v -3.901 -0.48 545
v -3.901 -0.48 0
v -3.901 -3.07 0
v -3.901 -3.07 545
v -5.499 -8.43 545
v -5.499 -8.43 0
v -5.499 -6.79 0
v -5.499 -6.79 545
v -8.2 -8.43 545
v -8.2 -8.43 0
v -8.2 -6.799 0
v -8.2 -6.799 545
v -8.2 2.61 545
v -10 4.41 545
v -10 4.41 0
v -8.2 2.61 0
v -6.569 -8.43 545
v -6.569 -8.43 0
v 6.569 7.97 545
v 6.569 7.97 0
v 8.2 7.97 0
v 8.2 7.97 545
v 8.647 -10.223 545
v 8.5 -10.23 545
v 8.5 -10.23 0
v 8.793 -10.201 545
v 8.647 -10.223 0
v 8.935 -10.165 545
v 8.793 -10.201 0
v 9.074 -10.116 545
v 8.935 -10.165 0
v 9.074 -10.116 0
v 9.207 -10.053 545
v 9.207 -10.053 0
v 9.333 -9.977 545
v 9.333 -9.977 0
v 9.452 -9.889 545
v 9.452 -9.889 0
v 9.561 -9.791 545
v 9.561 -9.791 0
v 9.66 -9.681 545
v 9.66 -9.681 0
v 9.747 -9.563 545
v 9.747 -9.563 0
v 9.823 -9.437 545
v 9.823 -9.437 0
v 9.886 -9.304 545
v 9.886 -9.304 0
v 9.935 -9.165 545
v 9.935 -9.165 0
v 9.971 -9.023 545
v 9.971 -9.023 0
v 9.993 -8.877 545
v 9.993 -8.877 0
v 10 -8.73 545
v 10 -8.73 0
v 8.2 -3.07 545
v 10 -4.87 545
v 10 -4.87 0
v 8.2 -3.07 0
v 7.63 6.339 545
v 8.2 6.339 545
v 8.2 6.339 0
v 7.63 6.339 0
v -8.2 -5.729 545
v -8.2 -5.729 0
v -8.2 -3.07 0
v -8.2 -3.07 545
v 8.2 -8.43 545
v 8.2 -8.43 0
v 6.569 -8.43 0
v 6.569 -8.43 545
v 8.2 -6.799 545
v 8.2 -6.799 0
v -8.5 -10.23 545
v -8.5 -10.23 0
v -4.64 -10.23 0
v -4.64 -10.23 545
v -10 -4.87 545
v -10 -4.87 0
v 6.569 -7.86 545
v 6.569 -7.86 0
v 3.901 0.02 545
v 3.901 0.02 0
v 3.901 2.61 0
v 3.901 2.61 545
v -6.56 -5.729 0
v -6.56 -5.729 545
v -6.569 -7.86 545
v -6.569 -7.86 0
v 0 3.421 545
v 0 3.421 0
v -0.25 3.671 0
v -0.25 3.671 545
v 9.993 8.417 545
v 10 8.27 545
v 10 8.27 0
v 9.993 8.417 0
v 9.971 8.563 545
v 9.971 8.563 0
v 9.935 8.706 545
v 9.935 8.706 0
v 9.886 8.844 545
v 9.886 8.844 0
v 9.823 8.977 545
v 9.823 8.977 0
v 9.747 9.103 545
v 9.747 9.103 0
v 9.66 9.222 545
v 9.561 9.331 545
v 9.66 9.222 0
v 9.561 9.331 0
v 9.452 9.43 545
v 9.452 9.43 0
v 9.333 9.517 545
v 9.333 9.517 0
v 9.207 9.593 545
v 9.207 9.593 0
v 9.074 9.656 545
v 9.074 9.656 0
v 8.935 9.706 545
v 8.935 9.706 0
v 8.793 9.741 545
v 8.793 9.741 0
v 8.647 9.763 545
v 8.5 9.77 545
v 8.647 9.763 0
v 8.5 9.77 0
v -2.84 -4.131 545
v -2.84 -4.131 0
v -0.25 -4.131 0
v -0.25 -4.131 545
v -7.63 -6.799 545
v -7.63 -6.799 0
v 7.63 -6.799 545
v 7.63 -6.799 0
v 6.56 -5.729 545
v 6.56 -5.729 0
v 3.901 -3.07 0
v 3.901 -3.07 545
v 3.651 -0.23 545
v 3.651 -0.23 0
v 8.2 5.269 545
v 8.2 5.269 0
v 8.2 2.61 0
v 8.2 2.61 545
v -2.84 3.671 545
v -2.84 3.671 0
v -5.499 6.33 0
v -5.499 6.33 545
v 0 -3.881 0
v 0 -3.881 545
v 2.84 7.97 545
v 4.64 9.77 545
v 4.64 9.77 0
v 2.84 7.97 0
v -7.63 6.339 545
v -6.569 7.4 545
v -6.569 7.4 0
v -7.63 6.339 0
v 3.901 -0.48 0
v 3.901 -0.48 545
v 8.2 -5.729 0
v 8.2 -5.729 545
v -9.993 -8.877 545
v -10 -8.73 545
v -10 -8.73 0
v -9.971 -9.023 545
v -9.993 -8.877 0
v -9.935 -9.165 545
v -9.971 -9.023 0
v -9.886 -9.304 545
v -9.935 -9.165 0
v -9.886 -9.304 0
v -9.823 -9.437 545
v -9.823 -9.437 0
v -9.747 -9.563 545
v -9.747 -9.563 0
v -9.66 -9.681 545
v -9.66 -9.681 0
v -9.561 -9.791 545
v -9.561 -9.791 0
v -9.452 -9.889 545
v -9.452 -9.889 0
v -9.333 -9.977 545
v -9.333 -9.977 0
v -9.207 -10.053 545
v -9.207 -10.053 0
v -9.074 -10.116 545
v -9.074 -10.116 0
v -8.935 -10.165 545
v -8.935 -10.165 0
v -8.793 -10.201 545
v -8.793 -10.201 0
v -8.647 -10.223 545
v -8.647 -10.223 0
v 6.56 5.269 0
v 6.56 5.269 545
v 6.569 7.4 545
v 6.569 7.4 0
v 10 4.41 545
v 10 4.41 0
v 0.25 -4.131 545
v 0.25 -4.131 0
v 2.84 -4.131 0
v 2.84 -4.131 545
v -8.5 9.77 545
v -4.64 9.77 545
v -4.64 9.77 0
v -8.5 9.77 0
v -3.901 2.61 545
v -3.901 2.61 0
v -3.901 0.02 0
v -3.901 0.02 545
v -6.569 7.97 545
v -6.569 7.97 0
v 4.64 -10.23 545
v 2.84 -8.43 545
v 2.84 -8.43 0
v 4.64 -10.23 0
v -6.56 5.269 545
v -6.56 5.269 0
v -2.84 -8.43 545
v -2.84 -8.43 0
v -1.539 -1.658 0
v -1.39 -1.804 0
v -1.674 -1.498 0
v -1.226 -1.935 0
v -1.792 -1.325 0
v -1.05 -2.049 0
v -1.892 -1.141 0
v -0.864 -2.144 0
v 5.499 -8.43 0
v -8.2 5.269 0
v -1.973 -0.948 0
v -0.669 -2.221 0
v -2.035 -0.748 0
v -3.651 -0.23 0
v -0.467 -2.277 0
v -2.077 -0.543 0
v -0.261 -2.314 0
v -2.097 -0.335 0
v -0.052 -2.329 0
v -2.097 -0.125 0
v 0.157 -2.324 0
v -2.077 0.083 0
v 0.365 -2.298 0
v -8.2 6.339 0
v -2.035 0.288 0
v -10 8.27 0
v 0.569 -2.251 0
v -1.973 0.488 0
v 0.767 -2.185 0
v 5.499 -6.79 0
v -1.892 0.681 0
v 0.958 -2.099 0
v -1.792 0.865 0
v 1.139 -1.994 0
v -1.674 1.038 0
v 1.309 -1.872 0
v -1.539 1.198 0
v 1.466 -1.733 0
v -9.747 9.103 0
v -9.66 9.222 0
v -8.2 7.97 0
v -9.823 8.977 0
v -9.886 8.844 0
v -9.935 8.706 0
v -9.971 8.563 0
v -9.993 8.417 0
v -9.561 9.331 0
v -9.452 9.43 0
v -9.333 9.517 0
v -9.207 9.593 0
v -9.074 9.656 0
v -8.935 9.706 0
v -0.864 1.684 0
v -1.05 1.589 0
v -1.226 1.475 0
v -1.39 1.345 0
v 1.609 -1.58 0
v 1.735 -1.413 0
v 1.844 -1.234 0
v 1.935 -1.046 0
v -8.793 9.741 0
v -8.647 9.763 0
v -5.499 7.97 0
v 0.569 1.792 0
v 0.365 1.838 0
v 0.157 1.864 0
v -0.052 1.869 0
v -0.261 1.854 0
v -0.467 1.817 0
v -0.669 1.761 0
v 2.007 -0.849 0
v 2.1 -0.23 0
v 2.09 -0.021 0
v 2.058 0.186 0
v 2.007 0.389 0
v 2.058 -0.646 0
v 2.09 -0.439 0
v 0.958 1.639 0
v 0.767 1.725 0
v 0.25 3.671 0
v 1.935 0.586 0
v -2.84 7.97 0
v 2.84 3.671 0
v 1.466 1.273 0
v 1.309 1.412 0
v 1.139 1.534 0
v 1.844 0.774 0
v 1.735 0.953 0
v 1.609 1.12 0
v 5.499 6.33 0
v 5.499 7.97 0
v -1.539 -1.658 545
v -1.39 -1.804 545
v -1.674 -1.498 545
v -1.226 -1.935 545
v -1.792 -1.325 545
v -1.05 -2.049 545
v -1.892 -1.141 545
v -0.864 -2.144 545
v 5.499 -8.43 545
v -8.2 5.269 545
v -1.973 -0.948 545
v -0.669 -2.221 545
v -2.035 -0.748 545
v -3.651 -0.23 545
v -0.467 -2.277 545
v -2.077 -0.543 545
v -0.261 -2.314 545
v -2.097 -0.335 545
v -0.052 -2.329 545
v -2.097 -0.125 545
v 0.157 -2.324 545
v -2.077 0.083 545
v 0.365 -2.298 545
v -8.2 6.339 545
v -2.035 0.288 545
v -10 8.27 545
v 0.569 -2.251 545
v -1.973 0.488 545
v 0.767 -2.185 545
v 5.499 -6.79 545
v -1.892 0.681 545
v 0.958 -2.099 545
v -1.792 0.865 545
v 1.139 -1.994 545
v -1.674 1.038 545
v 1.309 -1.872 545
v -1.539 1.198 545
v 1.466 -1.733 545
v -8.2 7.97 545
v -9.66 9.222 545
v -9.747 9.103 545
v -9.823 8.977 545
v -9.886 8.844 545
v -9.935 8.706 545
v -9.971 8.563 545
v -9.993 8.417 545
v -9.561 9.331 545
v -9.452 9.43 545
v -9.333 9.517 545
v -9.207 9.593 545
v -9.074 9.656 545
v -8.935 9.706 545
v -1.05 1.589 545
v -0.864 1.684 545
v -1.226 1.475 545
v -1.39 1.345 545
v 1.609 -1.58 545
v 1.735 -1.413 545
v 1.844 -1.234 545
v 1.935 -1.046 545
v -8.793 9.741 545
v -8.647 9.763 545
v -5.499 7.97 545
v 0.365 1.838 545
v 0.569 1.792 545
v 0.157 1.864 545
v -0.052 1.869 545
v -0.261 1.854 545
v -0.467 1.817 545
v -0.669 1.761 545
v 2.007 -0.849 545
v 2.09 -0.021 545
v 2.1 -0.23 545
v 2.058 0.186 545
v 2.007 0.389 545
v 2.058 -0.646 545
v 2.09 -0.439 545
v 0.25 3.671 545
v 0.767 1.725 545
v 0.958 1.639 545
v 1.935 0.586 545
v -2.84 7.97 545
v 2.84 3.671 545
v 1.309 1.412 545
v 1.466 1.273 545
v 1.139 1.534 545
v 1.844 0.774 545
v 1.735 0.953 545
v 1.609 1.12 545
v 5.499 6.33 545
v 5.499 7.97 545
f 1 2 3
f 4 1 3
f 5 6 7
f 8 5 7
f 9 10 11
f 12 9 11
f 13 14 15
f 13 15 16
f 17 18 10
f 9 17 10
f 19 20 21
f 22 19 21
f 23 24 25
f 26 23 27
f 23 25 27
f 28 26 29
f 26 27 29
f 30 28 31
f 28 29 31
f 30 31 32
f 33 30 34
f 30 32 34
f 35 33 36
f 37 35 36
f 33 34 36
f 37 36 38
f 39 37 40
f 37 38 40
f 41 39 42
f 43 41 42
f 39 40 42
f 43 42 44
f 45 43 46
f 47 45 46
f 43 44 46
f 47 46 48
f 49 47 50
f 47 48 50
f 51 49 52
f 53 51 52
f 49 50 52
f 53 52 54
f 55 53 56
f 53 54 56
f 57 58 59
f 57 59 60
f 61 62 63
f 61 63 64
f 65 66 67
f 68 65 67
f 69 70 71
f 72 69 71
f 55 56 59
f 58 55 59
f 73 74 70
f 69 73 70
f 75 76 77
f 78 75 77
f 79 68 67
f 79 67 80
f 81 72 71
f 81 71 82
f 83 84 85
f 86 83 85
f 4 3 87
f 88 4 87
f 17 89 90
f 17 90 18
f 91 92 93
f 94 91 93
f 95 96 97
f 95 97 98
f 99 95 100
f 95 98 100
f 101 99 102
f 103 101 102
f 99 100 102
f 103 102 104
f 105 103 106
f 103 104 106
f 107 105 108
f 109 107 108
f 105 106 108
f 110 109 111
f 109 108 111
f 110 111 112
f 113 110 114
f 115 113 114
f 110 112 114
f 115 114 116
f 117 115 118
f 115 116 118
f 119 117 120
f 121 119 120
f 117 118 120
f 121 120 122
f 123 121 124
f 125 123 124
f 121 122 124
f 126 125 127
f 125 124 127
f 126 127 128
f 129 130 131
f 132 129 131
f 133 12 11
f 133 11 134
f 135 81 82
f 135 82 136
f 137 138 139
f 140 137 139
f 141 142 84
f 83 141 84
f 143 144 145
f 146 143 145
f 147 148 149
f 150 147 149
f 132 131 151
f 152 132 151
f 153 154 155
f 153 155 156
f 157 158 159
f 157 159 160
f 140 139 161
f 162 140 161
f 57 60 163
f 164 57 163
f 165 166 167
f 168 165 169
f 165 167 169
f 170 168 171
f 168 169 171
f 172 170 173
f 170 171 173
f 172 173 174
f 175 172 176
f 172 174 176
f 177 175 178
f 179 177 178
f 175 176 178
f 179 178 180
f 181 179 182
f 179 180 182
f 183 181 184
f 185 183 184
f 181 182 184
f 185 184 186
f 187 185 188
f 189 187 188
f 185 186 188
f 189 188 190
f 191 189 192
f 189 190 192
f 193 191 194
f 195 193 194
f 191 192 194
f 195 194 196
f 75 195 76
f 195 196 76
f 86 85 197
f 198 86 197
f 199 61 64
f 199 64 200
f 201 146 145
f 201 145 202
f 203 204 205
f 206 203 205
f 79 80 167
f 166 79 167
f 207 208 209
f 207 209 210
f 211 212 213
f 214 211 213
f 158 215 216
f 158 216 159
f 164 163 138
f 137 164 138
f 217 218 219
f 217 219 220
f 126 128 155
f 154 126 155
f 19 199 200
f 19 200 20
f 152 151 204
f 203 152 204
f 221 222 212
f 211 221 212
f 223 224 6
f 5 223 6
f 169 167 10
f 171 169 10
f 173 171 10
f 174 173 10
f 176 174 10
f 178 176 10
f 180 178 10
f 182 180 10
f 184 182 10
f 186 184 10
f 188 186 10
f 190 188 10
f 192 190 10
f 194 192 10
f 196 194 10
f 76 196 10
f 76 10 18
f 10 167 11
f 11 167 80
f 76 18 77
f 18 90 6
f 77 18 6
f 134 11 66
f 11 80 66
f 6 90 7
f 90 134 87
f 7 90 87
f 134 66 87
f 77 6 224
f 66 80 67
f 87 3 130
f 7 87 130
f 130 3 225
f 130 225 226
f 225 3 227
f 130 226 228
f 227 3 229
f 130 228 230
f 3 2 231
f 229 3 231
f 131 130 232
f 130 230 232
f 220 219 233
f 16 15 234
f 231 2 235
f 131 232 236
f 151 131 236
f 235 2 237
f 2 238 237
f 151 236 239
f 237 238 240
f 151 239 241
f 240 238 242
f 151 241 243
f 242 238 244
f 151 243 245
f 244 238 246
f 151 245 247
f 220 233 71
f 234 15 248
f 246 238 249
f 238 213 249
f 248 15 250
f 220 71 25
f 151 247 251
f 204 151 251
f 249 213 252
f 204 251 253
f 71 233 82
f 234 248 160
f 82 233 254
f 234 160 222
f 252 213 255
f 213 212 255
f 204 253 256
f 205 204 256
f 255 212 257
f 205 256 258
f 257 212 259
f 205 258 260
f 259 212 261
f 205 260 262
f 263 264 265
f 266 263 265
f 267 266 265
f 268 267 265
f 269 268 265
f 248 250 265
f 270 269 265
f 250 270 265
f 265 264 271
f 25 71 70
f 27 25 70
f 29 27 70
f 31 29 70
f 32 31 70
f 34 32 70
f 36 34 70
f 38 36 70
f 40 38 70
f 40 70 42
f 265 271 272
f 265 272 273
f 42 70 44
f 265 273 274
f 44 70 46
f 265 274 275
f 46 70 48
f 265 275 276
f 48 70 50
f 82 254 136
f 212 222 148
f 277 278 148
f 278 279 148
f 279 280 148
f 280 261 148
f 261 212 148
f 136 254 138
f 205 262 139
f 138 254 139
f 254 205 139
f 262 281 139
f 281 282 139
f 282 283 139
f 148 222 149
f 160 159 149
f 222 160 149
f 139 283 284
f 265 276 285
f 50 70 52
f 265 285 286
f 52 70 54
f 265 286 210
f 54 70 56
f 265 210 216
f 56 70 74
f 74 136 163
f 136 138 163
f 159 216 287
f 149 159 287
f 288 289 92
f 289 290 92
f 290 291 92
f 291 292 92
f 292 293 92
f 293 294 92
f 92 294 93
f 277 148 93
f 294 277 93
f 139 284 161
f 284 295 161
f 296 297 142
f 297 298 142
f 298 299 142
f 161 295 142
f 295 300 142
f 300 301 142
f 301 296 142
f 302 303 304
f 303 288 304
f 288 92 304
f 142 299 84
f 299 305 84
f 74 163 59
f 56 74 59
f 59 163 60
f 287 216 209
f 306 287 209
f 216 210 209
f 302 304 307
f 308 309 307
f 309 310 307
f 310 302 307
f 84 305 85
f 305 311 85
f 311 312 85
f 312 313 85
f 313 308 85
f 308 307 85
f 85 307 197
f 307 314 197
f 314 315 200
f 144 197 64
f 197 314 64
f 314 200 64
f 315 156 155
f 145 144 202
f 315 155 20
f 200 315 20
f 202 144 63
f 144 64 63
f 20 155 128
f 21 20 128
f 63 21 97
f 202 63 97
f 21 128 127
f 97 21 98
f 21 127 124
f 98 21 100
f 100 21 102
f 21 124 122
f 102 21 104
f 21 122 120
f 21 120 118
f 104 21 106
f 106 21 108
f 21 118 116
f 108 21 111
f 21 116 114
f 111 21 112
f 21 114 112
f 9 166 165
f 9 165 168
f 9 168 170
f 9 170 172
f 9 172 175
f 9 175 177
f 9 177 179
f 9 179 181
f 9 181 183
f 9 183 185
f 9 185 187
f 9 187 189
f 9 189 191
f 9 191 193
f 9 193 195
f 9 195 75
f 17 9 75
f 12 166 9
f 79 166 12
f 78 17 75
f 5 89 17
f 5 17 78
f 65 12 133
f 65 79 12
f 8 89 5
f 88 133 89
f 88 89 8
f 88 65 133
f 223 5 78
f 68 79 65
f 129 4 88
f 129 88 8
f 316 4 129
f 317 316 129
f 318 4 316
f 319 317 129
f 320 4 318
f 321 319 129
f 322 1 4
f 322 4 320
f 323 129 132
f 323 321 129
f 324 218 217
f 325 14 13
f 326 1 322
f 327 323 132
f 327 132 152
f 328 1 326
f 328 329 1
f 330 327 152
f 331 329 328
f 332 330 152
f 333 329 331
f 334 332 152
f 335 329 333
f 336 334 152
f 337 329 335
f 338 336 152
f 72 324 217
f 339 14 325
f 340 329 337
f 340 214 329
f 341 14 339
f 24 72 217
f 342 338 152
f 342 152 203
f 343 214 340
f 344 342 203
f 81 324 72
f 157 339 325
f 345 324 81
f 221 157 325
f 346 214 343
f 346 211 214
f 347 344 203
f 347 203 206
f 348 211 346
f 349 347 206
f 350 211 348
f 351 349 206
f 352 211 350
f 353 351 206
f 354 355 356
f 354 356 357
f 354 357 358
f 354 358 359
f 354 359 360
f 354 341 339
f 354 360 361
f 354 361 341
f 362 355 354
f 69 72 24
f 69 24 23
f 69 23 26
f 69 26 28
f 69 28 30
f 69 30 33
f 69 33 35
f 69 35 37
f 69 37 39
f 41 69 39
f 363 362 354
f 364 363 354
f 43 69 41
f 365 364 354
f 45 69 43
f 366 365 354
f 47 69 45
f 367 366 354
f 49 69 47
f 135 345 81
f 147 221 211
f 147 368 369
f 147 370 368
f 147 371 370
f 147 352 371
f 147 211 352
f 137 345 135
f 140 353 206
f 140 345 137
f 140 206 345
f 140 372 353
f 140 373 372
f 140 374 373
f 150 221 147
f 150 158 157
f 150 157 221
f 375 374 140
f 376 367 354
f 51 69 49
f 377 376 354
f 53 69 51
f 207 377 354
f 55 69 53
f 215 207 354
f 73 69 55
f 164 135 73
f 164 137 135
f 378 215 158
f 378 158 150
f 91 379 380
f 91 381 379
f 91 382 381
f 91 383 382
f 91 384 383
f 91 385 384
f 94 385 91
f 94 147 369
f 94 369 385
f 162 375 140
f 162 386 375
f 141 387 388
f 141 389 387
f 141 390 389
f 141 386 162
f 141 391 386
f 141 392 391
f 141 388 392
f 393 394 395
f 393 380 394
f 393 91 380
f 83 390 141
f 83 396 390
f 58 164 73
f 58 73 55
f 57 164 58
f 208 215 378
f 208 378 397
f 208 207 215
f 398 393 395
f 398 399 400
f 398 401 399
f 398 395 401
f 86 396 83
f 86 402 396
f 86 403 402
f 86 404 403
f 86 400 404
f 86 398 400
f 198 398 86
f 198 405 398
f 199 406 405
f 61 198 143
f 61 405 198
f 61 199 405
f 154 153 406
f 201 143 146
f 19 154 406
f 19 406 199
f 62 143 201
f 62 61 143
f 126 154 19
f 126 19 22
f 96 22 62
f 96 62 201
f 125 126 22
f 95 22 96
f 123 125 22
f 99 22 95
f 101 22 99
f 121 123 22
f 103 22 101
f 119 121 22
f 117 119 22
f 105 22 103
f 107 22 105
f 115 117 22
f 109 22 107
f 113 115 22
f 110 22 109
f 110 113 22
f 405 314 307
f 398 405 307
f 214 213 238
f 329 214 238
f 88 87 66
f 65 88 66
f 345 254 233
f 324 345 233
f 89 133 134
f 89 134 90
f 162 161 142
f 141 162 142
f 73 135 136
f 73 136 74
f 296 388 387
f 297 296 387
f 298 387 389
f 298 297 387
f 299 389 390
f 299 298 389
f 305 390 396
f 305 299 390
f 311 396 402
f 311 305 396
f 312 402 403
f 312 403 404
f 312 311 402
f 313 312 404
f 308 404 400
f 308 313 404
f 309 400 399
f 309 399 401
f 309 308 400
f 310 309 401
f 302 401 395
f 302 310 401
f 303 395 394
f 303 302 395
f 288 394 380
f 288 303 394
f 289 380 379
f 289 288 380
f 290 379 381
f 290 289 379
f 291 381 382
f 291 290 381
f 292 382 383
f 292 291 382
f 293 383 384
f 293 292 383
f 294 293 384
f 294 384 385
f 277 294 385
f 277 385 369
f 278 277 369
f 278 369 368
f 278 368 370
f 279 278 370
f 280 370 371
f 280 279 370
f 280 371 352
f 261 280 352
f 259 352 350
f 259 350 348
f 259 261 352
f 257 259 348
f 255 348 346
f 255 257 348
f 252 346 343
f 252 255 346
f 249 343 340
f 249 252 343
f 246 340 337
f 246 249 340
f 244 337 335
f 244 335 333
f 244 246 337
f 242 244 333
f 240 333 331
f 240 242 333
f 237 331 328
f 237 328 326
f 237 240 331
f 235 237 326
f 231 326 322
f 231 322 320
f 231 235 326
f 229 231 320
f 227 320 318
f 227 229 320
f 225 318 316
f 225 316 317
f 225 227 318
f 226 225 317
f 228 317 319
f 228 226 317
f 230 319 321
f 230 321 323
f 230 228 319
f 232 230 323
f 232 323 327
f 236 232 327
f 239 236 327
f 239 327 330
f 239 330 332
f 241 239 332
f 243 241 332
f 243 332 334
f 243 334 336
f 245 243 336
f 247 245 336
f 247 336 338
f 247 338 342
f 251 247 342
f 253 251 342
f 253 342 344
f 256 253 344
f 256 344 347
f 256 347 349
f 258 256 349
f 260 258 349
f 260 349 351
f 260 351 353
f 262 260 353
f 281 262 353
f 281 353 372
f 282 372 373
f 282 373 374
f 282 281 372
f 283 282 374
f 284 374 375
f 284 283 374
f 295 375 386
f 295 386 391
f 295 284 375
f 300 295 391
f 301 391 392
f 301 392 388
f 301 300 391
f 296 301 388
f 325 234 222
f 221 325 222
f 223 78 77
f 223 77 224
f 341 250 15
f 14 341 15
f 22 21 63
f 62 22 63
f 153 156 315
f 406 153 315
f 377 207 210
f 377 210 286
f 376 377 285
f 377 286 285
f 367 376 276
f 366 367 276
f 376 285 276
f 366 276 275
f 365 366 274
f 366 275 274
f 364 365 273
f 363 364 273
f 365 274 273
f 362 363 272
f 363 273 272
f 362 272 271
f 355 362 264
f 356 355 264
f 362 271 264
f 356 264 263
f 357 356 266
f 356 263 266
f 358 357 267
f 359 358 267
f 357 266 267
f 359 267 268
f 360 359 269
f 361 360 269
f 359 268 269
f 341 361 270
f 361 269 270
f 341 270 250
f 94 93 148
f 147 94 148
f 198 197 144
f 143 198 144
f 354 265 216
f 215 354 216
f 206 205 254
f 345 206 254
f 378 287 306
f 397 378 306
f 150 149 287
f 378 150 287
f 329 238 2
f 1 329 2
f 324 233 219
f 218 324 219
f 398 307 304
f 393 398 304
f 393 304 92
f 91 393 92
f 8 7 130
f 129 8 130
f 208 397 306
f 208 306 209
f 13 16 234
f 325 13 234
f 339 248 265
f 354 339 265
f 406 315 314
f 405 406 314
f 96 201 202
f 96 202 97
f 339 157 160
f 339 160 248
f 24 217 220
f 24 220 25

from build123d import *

# Parameters (mm, degrees)
F0_R     = 2.1
F1_DEPTH = 545


with BuildPart() as f1:
    # F0 (on Top) → F1 (new body)
    with BuildSketch(Plane.XY):
        with BuildLine():
            Line((10, 4.410115), (10, 8.270115))
            ThreePointArc((10, 8.270115), (9.56066, 9.330775), (8.5, 9.770115))
            Line((8.5, 9.770115), (4.64, 9.770115))
            Line((4.64, 9.770115), (2.84, 7.970115))
            Line((2.84, 7.970115), (5.49934, 7.970115))
            Line((5.49934, 7.970115), (5.49934, 6.330115))
            Line((5.49934, 6.330115), (2.84, 3.670775))
            Line((2.84, 3.670775), (0.25, 3.670775))
            Line((0.25, 3.670775), (0, 3.420775))
            Line((0, 3.420775), (-0.25, 3.670775))
            Line((-0.25, 3.670775), (-2.84, 3.670775))
            Line((-2.84, 3.670775), (-5.49934, 6.330115))
            Line((-5.49934, 6.330115), (-5.49934, 7.970115))
            Line((-5.49934, 7.970115), (-2.84, 7.970115))
            Line((-2.84, 7.970115), (-4.64, 9.770115))
            Line((-4.64, 9.770115), (-8.5, 9.770115))
            ThreePointArc((-8.5, 9.770115), (-9.56066, 9.330775), (-10, 8.270115))
            Line((-10, 8.270115), (-10, 4.410115))
            Line((-10, 4.410115), (-8.2, 2.610115))
            Line((-8.2, 2.610115), (-8.2, 5.269455))
            Line((-8.2, 5.269455), (-6.56, 5.269455))
            Line((-6.56, 5.269455), (-3.90066, 2.610115))
            Line((-3.90066, 2.610115), (-3.90066, 0.020115))
            Line((-3.90066, 0.020115), (-3.65066, -0.229885))
            Line((-3.65066, -0.229885), (-3.90066, -0.479885))
            Line((-3.90066, -0.479885), (-3.90066, -3.069885))
            Line((-3.90066, -3.069885), (-6.56, -5.729225))
            Line((-6.56, -5.729225), (-8.2, -5.729225))
            Line((-8.2, -5.729225), (-8.2, -3.069885))
            Line((-8.2, -3.069885), (-10, -4.869885))
            Line((-10, -4.869885), (-10, -8.729885))
            ThreePointArc((-10, -8.729885), (-9.56066, -9.790545), (-8.5, -10.229885))
            Line((-8.5, -10.229885), (-4.64, -10.229885))
            Line((-4.64, -10.229885), (-2.84, -8.429885))
            Line((-2.84, -8.429885), (-5.49934, -8.429885))
            Line((-5.49934, -8.429885), (-5.49934, -6.789885))
            Line((-5.49934, -6.789885), (-2.84, -4.130545))
            Line((-2.84, -4.130545), (-0.25, -4.130545))
            Line((-0.25, -4.130545), (0, -3.880545))
            Line((0, -3.880545), (0.25, -4.130545))
            Line((0.25, -4.130545), (2.84, -4.130545))
            Line((2.84, -4.130545), (5.49934, -6.789885))
            Line((5.49934, -6.789885), (5.49934, -8.429885))
            Line((5.49934, -8.429885), (2.84, -8.429885))
            Line((2.84, -8.429885), (4.64, -10.229885))
            Line((4.64, -10.229885), (8.5, -10.229885))
            ThreePointArc((8.5, -10.229885), (9.56066, -9.790545), (10, -8.729885))
            Line((10, -8.729885), (10, -4.869885))
            Line((10, -4.869885), (8.2, -3.069885))
            Line((8.2, -3.069885), (8.2, -5.729225))
            Line((8.2, -5.729225), (6.56, -5.729225))
            Line((6.56, -5.729225), (3.90066, -3.069885))
            Line((3.90066, -3.069885), (3.90066, -0.479885))
            Line((3.90066, -0.479885), (3.65066, -0.229885))
            Line((3.65066, -0.229885), (3.90066, 0.020115))
            Line((3.90066, 0.020115), (3.90066, 2.610115))
            Line((3.90066, 2.610115), (6.56, 5.269455))
            Line((6.56, 5.269455), (8.2, 5.269455))
            Line((8.2, 5.269455), (8.2, 2.610115))
            Line((8.2, 2.610115), (10, 4.410115))
        make_face()
        Polygon((-6.56934, -7.859885), (-6.56934, -8.429885), (-8.2, -8.429885), (-8.2, -6.799225), (-7.63, -6.799225), align=None, mode=Mode.SUBTRACT)
        Polygon((8.2, -8.429885), (6.56934, -8.429885), (6.56934, -7.859885), (7.63, -6.799225), (8.2, -6.799225), align=None, mode=Mode.SUBTRACT)
        Polygon((-7.63, 6.339455), (-8.2, 6.339455), (-8.2, 7.970115), (-6.56934, 7.970115), (-6.56934, 7.400115), align=None, mode=Mode.SUBTRACT)
        with Locations((0, -0.229885)):
            Circle(F0_R, mode=Mode.SUBTRACT)
        Polygon((6.56934, 7.400115), (6.56934, 7.970115), (8.2, 7.970115), (8.2, 6.339455), (7.63, 6.339455), align=None, mode=Mode.SUBTRACT)
    extrude(amount=F1_DEPTH)


solid = f1.part
